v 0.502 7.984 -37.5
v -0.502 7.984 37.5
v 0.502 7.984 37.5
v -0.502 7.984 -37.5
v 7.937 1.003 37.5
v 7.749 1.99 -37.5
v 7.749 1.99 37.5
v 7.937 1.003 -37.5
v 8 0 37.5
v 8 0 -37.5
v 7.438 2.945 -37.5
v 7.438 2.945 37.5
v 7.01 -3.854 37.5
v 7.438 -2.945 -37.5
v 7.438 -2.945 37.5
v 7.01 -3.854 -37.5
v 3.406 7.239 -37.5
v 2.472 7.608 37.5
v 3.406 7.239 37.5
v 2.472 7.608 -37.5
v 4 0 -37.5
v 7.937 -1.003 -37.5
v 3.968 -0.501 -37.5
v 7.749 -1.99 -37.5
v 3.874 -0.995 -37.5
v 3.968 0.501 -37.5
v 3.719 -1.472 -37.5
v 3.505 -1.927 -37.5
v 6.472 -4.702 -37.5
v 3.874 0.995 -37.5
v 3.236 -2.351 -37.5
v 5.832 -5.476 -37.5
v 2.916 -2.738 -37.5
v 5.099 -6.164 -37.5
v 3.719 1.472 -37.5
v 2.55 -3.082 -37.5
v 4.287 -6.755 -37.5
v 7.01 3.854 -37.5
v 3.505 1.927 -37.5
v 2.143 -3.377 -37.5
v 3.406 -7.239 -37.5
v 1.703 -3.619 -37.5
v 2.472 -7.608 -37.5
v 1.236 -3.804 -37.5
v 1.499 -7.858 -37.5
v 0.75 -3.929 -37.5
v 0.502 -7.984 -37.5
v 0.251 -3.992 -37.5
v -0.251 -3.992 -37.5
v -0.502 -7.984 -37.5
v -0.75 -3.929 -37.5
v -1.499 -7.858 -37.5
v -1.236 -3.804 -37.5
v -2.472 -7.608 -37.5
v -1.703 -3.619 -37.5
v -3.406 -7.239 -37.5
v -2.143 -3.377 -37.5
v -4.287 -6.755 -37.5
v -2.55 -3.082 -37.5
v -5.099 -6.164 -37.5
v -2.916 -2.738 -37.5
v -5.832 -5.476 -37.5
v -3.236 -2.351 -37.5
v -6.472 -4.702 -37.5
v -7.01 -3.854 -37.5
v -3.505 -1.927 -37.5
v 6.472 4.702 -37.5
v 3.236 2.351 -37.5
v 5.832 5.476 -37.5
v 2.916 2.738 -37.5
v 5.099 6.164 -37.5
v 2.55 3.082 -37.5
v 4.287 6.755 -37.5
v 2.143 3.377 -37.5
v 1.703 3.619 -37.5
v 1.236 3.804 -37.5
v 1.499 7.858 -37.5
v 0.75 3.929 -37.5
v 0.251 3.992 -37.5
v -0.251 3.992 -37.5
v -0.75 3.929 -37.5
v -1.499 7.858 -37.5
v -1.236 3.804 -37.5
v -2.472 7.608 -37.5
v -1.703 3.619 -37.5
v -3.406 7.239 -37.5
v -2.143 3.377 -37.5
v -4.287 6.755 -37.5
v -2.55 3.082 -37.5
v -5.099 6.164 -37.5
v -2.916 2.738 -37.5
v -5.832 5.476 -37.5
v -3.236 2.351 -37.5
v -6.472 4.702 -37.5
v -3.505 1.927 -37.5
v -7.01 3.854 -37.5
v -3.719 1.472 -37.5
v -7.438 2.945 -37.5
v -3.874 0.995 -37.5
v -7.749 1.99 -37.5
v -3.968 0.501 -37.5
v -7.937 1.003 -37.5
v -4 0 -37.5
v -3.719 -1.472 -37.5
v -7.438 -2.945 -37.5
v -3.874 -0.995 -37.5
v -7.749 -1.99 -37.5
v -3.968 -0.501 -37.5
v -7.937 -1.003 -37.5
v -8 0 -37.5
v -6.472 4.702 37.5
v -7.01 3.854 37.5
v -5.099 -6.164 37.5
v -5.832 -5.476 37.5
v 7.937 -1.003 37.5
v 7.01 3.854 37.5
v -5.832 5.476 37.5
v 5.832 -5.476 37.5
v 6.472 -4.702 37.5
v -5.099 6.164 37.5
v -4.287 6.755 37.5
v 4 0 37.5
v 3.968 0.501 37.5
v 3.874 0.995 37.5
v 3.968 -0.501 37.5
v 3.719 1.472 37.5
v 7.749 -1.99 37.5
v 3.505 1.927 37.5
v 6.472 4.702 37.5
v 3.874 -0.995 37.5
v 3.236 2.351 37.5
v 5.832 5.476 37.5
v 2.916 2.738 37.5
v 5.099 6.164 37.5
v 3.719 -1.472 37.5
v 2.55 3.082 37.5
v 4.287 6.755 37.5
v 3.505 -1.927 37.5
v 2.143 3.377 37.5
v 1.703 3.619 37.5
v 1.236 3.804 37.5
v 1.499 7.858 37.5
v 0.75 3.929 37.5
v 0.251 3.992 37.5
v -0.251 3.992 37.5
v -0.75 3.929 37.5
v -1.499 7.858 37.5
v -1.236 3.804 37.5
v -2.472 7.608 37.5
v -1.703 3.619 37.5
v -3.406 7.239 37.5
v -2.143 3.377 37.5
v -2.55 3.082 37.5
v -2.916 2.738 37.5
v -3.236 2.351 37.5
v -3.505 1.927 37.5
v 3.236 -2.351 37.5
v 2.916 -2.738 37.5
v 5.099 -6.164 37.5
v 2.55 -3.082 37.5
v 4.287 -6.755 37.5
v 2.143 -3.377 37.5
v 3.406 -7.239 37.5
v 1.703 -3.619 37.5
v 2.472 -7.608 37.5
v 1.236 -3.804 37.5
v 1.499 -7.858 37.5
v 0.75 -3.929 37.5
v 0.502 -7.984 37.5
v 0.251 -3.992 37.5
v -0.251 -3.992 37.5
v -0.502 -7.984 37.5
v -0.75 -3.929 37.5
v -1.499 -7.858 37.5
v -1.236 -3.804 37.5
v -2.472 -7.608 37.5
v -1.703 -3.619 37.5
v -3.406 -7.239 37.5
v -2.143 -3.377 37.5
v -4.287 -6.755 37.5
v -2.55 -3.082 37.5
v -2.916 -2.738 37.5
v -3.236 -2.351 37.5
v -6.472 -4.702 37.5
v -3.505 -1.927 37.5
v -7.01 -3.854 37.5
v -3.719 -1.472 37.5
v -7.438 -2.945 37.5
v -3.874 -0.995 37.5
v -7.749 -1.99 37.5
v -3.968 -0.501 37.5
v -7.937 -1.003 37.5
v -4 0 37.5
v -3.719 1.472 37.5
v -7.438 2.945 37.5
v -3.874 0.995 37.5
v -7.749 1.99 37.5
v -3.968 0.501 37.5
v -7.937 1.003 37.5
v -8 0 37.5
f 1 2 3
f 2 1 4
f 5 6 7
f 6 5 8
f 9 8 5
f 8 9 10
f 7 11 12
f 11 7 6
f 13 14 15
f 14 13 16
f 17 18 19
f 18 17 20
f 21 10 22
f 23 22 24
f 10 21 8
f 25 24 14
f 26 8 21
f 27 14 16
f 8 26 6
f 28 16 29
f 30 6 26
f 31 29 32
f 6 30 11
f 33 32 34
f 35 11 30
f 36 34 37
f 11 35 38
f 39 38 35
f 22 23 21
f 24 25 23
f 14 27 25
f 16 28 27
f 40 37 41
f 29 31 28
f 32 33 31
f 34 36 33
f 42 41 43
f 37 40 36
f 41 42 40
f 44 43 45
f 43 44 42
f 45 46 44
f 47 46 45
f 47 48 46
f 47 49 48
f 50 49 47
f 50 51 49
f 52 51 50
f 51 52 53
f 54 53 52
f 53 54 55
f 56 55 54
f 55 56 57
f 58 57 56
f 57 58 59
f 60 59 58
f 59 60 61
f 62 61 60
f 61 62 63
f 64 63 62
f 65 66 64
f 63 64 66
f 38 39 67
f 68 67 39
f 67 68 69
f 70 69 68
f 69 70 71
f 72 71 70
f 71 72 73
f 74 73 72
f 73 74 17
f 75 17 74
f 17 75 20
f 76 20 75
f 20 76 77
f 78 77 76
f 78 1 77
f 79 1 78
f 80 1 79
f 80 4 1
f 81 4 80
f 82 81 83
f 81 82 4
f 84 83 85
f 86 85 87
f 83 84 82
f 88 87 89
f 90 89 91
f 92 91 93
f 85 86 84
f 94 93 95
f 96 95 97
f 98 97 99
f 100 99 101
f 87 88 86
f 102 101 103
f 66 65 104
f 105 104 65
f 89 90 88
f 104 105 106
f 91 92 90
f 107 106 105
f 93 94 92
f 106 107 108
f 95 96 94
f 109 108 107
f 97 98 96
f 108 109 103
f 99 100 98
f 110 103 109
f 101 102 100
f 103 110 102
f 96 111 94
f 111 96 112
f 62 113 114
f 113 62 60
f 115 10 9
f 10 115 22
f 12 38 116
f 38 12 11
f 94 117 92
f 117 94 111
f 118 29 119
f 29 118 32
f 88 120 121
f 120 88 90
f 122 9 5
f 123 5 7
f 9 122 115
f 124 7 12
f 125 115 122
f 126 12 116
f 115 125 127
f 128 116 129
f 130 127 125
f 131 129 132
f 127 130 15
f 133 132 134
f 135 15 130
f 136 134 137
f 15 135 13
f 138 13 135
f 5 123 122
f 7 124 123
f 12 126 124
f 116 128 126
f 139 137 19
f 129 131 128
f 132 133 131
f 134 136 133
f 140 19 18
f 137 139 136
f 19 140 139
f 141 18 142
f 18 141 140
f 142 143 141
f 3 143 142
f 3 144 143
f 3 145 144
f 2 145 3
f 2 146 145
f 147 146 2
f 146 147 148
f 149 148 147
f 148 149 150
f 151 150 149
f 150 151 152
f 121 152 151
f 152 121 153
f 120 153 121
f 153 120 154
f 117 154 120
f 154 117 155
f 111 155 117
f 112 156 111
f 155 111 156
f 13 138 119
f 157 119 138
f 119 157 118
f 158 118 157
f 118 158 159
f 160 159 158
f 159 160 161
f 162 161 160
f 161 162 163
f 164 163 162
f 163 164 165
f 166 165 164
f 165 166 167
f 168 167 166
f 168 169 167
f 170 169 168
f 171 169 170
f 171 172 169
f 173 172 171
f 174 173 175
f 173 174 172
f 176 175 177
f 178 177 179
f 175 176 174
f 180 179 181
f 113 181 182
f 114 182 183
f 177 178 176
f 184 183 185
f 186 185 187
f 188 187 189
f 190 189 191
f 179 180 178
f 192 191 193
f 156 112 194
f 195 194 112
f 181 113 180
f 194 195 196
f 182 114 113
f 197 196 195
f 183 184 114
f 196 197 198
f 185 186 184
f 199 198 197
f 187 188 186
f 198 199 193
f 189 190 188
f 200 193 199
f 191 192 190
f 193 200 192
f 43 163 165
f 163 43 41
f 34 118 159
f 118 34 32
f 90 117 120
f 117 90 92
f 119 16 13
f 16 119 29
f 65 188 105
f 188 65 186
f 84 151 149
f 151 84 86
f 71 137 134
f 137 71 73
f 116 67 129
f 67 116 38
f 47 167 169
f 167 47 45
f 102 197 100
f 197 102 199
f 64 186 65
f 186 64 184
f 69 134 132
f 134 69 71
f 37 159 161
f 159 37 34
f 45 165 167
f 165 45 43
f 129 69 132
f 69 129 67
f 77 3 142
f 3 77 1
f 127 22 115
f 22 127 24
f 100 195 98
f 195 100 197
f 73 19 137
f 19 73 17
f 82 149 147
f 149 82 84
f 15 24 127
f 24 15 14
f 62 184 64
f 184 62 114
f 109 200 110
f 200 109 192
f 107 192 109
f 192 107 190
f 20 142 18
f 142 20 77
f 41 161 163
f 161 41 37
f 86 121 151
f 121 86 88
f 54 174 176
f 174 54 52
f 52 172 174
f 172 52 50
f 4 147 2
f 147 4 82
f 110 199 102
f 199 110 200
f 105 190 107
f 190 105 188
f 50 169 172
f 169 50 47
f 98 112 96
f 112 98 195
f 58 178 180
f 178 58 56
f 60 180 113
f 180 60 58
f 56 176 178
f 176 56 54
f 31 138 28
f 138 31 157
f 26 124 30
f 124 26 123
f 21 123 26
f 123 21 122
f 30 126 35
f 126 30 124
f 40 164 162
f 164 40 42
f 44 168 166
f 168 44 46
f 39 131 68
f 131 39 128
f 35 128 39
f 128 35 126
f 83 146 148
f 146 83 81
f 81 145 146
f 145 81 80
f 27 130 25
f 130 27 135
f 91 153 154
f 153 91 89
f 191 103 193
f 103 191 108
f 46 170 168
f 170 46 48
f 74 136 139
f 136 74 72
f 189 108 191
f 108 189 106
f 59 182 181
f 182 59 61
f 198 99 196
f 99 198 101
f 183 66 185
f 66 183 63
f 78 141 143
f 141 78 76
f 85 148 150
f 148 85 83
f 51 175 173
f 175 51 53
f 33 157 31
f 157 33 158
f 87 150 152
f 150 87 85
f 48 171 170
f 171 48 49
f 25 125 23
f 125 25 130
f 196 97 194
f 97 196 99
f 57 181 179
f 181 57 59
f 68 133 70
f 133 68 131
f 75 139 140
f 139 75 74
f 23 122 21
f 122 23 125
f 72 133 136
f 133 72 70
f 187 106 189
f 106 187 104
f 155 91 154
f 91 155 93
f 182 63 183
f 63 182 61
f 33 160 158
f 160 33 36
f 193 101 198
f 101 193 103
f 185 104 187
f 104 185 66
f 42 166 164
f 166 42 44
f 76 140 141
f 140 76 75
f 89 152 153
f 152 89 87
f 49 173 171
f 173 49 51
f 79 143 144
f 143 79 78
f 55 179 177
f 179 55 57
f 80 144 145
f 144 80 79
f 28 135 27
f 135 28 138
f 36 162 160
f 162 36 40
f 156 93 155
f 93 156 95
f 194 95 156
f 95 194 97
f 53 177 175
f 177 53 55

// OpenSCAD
$fn = 50;


difference() {
	union() {
		translate(v = [0, 0, -37.5000000000]) {
			cylinder(h = 75, r = 8.0000000000);
		}
	}
	union() {
		translate(v = [0, 0, -100.0000000000]) {
			cylinder(h = 200, r = 4.0000000000);
		}
	}
}
